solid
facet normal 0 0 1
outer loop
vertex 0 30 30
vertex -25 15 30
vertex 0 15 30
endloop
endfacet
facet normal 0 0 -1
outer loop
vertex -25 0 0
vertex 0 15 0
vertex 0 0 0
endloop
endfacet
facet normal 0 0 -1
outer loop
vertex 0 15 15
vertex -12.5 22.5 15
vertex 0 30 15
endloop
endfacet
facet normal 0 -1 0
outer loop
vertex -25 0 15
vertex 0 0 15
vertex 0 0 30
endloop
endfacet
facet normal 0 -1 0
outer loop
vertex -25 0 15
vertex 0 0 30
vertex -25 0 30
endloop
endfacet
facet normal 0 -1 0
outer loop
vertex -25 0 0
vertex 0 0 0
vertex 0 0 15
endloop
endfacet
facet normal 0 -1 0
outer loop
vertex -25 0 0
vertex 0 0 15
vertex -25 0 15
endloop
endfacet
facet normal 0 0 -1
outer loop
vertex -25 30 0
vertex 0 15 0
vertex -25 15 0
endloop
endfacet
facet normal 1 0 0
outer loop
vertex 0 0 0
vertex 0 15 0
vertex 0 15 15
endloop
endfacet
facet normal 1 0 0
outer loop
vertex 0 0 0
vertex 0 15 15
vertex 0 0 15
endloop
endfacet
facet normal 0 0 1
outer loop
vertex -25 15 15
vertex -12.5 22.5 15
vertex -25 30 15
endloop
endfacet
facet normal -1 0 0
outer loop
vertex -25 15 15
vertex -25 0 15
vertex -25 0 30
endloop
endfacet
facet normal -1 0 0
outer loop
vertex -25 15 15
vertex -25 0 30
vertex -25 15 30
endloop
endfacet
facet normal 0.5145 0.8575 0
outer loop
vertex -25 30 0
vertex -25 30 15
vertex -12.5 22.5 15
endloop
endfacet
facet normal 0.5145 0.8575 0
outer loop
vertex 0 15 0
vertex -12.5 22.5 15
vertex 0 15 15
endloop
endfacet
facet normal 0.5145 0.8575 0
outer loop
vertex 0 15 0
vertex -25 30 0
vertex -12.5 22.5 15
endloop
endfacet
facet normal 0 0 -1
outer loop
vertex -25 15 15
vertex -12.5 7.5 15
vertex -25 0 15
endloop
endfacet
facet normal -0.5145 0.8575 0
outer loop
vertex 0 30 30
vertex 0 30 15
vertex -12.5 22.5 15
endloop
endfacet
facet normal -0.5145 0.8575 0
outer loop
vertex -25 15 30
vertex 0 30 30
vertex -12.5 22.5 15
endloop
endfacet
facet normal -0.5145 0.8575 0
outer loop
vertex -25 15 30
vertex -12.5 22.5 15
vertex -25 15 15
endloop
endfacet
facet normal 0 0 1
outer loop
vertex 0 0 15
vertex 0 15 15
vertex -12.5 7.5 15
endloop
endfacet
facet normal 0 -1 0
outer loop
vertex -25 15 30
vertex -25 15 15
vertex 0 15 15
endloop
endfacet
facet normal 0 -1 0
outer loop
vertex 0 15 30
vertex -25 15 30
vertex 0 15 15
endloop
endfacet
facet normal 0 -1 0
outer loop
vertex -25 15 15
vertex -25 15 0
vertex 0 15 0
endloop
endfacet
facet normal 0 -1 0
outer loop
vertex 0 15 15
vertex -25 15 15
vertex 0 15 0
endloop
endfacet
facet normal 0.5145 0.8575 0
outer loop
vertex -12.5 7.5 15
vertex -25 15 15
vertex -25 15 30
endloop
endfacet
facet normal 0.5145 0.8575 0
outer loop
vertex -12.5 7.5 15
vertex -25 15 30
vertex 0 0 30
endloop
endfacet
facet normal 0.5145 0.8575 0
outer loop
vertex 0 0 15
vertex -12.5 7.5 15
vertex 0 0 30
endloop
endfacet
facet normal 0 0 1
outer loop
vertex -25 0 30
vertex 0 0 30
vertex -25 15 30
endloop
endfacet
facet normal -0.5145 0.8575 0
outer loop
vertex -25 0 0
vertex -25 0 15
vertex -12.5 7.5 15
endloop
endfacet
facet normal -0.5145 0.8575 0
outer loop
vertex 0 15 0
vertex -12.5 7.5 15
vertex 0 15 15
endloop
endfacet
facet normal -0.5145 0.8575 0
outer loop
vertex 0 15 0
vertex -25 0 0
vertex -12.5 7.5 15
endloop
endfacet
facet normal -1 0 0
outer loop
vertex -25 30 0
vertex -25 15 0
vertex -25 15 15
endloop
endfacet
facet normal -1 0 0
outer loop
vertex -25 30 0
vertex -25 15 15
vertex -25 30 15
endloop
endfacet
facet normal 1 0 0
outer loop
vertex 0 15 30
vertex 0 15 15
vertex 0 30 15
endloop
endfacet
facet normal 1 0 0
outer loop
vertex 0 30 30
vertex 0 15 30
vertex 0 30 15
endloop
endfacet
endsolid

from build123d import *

# Parameters (mm, degrees)
BOSS_EXTRUDE1_DEPTH = 15
BOSS_EXTRUDE2_DEPTH = 15
BOSS_EXTRUDE3_DEPTH = 15
BOSS_EXTRUDE4_DEPTH = 15


with BuildPart() as part:
    # Sketch1 → Boss-Extrude1 (new body)
    with BuildSketch(Plane.XY):
        Polygon((-25, 0), (0, 15), (0, 0), align=None)
    extrude(amount=BOSS_EXTRUDE1_DEPTH)

    # Sketch3 → Boss-Extrude3 (add)
    with BuildSketch(Plane.XY.offset(15)):
        Polygon((0, 0), (-25, 0), (-25, 15), align=None)
    extrude(amount=BOSS_EXTRUDE3_DEPTH)


with BuildPart() as body_2:
    # Sketch2 → Boss-Extrude2 (new body)
    with BuildSketch(Plane(origin=(0, 0, 0), x_dir=(-1, 0, 0), z_dir=(0, 0, -1))):
        Polygon((0, 15), (25.000468659, 15), (25.000468659, 30), align=None)
    extrude(amount=-BOSS_EXTRUDE2_DEPTH)

    # Sketch4 → Boss-Extrude4 (add)
    with BuildSketch(Plane.XY.offset(15)):
        Polygon((-25.000468659, 15), (0, 15), (0, 30), align=None)
    extrude(amount=BOSS_EXTRUDE4_DEPTH)


solid = Compound([part.part, body_2.part])
